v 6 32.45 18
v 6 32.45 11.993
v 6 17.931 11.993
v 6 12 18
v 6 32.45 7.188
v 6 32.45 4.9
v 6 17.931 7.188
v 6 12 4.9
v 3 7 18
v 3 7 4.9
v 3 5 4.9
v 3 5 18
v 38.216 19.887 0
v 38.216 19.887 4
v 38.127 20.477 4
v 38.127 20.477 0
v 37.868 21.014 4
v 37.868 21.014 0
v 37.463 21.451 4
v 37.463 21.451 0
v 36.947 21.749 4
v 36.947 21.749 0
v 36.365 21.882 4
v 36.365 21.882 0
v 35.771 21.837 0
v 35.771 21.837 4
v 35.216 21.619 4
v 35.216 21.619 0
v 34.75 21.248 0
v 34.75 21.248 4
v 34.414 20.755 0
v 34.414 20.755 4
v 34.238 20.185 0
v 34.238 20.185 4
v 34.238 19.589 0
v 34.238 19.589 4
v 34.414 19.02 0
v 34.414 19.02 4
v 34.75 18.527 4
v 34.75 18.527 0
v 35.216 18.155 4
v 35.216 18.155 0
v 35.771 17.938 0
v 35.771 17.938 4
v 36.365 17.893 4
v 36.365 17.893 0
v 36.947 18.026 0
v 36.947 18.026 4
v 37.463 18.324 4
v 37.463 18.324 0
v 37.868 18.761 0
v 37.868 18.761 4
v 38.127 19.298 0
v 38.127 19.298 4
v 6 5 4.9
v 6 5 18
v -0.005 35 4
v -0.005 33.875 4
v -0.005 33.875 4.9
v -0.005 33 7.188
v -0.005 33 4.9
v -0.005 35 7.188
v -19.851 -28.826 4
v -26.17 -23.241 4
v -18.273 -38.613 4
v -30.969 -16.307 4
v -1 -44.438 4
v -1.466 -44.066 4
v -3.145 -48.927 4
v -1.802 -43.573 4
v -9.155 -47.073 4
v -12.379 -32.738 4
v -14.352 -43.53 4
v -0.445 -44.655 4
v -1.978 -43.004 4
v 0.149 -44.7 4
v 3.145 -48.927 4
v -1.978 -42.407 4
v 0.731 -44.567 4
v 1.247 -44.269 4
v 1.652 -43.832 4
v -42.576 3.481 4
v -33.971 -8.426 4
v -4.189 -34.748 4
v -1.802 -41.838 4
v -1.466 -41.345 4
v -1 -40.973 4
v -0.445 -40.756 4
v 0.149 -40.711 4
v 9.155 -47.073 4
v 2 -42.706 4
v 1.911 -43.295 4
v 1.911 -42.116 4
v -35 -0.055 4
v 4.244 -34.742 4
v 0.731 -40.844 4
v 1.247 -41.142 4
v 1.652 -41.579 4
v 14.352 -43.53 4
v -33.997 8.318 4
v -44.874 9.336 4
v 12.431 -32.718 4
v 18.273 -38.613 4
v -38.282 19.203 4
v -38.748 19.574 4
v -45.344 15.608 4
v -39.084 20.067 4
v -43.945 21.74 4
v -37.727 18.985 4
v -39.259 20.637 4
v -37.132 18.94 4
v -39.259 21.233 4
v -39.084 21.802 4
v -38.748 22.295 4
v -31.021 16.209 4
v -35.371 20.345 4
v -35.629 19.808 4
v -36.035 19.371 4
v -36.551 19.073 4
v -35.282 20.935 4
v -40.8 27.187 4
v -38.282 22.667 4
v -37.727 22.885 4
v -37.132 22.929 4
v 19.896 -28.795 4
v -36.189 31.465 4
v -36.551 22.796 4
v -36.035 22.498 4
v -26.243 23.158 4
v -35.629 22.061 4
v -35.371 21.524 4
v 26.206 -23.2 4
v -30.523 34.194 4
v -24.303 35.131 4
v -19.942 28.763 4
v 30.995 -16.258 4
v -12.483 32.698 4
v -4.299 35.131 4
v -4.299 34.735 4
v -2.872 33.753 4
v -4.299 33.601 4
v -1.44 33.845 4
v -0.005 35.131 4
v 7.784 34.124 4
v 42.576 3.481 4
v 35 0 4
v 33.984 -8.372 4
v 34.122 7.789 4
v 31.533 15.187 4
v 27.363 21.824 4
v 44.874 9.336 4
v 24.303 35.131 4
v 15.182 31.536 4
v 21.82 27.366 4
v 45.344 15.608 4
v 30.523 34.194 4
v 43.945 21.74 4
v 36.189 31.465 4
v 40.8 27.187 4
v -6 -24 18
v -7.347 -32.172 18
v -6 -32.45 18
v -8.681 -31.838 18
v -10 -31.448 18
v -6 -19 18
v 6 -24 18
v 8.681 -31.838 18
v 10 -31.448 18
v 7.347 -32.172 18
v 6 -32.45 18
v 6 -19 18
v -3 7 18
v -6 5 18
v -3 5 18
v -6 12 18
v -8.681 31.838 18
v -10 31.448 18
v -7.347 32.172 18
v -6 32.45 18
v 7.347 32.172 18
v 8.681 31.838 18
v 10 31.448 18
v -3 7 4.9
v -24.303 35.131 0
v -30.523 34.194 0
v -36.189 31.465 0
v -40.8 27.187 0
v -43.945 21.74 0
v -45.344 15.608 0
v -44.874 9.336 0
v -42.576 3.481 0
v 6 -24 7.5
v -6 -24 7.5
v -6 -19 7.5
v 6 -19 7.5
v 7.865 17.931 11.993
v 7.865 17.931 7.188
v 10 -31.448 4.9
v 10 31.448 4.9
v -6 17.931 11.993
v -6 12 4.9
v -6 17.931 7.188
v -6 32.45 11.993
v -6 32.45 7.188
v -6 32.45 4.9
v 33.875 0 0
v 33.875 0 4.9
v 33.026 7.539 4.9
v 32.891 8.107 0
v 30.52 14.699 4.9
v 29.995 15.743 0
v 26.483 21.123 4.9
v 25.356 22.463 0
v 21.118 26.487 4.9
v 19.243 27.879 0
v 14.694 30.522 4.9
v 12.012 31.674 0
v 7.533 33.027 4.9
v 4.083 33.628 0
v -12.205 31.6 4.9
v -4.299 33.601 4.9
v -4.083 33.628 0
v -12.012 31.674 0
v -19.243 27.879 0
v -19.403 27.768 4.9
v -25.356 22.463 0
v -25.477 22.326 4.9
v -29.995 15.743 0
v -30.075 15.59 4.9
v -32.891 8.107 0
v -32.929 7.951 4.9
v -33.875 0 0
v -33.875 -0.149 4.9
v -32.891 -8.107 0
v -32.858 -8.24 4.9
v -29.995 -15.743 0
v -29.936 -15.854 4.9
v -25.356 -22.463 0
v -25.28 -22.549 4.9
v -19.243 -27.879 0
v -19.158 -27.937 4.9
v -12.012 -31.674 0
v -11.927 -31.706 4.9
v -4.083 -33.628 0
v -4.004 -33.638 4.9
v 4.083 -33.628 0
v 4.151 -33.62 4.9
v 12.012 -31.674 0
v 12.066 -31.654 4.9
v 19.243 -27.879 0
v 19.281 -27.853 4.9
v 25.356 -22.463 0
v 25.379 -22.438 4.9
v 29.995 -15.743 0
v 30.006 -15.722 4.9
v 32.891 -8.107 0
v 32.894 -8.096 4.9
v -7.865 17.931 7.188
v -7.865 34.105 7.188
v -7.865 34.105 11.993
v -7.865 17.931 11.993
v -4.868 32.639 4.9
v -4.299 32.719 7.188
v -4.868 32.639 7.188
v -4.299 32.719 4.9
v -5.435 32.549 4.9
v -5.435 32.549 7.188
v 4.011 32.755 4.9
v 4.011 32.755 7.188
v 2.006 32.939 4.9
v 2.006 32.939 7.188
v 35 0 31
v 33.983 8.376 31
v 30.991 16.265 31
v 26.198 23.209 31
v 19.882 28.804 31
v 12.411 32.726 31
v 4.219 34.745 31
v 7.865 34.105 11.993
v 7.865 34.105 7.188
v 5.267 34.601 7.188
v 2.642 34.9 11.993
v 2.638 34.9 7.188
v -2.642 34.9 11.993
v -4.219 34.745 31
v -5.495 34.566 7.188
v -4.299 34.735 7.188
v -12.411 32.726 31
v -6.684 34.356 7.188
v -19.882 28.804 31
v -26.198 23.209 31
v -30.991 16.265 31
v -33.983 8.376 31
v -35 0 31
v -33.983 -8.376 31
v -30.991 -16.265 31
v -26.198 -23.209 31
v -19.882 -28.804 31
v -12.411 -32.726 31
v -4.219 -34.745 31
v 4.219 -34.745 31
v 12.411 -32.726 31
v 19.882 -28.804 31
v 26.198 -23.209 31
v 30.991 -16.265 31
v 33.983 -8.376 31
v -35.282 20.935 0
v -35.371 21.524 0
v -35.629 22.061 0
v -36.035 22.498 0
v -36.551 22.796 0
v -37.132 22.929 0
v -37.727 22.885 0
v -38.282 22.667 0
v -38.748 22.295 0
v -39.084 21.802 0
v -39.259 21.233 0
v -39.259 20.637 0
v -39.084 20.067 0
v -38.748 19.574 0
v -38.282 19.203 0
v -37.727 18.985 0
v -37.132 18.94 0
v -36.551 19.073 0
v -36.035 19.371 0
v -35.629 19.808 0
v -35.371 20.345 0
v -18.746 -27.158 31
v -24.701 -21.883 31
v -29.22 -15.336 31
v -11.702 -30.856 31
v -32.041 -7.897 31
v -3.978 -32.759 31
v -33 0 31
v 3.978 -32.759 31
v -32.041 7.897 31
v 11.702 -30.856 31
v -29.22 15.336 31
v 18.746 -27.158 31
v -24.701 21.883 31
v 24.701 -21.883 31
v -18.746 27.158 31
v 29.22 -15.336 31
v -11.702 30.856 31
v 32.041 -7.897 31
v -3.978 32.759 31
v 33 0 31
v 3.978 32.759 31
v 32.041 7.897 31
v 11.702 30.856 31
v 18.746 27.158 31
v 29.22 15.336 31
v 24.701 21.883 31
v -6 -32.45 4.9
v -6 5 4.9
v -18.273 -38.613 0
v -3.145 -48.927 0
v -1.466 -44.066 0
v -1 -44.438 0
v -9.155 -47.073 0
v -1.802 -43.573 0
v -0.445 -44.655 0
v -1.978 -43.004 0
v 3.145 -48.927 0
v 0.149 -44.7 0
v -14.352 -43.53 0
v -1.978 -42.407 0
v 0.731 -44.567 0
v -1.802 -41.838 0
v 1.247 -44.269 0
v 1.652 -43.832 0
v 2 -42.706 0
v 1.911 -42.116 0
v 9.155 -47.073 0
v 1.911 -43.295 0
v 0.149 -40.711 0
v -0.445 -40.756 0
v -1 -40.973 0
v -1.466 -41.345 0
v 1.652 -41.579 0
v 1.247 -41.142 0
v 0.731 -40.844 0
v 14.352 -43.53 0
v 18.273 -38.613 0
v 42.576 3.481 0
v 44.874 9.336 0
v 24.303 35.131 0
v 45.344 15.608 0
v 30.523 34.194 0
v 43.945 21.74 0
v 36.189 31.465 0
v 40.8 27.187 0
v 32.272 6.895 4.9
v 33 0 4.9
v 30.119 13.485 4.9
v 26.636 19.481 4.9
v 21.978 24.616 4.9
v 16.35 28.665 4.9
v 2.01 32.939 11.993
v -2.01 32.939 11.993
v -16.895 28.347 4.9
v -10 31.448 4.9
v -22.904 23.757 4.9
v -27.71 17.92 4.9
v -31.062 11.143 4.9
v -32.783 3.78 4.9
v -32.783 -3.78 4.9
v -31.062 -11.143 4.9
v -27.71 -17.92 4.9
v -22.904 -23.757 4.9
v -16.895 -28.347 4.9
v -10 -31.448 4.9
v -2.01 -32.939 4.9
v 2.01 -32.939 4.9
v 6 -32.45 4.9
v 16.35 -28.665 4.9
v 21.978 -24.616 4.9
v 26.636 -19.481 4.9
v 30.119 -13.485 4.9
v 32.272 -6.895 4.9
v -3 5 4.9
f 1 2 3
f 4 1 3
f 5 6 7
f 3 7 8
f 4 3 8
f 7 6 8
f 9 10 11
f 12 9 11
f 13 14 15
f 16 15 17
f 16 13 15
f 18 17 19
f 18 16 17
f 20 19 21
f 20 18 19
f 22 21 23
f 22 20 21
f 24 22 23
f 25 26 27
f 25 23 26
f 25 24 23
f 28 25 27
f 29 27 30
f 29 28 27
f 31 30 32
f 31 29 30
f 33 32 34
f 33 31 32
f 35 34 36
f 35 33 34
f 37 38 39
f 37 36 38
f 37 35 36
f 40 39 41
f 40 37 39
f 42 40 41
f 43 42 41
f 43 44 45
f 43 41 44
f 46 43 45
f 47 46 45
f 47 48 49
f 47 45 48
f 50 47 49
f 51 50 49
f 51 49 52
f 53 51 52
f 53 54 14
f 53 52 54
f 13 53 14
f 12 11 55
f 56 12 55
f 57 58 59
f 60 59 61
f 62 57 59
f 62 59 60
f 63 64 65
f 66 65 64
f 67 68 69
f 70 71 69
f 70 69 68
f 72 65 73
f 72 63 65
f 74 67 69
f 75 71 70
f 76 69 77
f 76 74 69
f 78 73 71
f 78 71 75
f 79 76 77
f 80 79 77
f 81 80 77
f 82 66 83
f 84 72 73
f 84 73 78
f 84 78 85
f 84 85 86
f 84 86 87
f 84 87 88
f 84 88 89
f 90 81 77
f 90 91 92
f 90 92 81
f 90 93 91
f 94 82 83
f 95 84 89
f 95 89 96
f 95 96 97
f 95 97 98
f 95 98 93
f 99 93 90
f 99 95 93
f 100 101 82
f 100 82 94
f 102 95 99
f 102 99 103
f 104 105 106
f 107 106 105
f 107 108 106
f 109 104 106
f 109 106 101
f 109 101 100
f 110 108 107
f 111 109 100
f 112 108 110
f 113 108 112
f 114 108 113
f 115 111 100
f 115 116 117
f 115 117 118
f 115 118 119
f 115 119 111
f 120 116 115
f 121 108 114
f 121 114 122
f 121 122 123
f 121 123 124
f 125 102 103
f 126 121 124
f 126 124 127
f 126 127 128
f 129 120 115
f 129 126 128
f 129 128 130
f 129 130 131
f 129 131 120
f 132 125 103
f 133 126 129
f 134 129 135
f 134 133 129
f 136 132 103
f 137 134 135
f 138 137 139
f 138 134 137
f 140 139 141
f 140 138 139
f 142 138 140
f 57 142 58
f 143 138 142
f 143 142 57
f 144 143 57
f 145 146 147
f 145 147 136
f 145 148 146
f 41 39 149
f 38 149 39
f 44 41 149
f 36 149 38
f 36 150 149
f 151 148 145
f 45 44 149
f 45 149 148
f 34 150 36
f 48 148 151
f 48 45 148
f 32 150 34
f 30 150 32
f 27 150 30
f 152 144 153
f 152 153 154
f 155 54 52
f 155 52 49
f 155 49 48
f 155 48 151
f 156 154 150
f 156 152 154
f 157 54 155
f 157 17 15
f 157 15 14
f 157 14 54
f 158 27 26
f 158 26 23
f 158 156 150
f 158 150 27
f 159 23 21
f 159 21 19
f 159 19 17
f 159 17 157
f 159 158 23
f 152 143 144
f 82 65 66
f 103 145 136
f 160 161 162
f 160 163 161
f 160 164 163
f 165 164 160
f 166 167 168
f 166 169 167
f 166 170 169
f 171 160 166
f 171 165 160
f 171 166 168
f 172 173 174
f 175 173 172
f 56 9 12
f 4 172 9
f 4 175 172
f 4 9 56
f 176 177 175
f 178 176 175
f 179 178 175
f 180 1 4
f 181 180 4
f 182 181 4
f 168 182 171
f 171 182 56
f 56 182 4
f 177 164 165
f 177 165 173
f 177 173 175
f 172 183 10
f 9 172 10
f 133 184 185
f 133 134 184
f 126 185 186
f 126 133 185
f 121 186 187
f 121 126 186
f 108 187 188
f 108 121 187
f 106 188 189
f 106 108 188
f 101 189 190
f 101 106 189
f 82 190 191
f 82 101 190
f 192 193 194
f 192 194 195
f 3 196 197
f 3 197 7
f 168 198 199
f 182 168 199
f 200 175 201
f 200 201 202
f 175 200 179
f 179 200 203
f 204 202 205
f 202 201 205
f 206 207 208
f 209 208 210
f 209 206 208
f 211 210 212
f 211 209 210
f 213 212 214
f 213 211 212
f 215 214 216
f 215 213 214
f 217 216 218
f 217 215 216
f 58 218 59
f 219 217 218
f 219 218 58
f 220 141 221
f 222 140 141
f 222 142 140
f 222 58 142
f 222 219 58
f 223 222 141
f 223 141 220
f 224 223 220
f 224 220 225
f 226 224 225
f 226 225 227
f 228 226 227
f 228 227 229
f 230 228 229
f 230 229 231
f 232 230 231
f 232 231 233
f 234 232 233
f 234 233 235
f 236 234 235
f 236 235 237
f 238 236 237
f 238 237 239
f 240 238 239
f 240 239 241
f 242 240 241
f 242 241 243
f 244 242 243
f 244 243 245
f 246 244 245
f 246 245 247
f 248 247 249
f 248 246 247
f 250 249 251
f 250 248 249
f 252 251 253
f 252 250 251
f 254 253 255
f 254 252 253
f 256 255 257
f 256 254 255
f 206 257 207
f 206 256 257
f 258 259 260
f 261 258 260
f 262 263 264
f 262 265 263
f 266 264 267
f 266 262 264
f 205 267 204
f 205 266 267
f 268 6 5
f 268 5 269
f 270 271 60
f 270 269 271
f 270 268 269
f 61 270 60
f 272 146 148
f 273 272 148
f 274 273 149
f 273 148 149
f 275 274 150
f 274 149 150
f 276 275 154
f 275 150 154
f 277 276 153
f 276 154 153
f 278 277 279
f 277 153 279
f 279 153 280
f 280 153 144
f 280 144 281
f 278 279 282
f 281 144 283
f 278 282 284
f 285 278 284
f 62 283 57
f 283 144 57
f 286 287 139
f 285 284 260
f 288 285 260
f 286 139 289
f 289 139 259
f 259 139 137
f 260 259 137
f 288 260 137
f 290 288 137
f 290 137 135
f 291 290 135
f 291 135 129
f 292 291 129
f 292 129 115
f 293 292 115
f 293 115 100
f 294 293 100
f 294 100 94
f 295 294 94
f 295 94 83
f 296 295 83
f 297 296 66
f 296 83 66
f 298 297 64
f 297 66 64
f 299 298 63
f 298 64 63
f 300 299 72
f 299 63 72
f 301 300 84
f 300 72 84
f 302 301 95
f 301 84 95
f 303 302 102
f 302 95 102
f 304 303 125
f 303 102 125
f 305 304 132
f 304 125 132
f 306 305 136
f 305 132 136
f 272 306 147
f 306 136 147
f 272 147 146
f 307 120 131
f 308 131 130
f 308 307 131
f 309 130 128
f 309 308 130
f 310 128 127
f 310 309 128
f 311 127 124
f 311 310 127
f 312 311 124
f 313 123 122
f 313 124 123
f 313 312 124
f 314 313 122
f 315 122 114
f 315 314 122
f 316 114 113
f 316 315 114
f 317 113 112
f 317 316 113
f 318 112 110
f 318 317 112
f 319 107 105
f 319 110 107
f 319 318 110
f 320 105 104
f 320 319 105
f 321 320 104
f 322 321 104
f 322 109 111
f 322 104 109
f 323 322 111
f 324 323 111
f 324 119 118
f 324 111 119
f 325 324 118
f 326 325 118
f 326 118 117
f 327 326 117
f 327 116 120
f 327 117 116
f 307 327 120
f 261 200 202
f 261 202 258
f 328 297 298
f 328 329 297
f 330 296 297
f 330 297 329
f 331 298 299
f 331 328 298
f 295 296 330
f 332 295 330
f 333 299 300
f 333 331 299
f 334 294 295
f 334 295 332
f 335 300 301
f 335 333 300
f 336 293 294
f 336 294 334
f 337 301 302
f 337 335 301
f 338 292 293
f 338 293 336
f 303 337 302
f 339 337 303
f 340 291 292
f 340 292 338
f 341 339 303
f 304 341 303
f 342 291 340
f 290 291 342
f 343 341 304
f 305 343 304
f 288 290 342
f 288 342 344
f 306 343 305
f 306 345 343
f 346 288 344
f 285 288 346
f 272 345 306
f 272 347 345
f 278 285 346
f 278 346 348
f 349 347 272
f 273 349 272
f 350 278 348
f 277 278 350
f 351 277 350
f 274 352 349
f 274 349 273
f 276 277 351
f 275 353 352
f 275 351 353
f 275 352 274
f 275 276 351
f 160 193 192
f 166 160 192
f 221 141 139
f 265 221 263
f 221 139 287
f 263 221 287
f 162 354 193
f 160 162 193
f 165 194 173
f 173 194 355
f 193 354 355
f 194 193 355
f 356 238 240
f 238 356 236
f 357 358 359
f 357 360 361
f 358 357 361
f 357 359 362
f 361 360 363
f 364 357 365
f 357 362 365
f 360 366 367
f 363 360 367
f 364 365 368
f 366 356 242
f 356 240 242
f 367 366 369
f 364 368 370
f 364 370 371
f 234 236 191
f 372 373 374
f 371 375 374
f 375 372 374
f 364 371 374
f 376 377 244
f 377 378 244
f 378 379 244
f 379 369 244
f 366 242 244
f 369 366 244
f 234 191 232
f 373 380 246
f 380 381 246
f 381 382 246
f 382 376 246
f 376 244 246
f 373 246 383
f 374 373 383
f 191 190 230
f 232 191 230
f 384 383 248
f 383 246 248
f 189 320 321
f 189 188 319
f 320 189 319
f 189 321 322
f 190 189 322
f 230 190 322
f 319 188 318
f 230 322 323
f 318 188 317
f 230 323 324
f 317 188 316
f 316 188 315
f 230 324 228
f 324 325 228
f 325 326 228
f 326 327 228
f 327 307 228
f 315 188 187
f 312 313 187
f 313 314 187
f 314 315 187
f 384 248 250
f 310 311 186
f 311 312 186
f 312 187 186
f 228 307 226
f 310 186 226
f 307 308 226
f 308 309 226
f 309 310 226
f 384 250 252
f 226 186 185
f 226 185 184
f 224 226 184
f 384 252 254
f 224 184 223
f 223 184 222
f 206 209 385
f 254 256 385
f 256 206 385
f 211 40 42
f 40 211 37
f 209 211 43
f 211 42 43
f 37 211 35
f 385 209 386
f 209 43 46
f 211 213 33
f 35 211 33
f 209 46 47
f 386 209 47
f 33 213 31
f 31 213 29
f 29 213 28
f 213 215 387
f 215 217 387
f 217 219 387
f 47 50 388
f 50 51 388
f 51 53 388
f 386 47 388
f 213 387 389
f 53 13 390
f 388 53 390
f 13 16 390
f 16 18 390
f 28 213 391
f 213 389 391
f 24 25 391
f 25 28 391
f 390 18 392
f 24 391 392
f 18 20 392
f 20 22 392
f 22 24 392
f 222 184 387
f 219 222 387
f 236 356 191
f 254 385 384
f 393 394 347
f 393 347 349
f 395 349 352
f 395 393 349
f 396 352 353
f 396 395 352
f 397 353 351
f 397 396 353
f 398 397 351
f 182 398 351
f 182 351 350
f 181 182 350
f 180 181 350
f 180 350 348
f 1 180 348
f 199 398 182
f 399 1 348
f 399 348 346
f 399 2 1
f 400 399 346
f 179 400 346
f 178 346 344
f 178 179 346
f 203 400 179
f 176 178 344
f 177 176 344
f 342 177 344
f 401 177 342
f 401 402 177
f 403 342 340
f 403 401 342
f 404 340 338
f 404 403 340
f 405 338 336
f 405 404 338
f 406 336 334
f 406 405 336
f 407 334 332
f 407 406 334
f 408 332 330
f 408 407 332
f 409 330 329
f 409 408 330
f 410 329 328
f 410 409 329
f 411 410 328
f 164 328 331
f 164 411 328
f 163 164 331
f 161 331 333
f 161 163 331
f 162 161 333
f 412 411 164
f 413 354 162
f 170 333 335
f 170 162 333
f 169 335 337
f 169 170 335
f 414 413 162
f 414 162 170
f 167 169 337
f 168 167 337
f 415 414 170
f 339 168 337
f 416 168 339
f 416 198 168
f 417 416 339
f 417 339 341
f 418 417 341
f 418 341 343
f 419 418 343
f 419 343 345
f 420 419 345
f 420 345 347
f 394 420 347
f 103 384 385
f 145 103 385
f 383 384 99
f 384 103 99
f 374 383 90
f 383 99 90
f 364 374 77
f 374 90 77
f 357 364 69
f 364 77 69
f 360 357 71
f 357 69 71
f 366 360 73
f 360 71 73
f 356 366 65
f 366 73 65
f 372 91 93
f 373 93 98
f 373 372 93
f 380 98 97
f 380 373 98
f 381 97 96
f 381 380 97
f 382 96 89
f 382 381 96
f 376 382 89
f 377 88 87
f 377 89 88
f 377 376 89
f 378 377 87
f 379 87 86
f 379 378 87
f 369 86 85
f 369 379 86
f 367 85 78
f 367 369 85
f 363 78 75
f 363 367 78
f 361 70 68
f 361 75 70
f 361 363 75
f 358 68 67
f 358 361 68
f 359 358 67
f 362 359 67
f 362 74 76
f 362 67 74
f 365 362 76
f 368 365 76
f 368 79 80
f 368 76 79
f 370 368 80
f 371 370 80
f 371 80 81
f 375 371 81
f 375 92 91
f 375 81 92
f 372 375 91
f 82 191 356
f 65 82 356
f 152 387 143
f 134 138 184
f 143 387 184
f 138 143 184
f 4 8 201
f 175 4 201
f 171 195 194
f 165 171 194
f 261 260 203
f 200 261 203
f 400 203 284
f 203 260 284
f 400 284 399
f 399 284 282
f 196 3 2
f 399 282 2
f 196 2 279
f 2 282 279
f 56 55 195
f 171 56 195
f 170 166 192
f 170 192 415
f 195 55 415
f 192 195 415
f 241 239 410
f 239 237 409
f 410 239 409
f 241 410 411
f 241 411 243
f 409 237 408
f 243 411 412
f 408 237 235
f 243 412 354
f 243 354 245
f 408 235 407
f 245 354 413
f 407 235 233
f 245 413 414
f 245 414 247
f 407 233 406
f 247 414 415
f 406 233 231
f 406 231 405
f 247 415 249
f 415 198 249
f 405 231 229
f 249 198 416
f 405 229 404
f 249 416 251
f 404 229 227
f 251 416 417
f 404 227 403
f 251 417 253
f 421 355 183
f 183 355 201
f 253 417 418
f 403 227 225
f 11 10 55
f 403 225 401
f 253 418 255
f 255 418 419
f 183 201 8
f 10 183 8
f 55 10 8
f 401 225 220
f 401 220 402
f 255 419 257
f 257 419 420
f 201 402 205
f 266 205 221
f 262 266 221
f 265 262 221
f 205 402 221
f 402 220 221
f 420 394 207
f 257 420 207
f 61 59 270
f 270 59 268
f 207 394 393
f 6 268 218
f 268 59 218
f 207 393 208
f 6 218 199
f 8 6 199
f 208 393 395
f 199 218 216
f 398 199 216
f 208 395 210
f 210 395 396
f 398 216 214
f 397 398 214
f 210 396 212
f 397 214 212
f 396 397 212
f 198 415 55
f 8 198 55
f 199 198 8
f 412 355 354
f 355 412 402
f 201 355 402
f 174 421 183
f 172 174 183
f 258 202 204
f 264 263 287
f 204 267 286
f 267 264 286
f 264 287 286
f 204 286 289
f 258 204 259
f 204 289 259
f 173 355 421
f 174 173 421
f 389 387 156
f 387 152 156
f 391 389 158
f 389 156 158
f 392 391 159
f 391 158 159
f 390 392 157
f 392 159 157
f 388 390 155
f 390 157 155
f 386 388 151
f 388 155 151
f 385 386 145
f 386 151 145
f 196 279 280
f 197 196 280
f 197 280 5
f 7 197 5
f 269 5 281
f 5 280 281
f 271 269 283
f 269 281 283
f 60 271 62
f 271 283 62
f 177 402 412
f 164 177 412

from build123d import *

# Parameters (mm, degrees)
F0_R              = 35
F0_R_2            = 33
F2_DEPTH          = 31
F3_DEPTH          = 18
F4_E28_W          = 6
F4_E28_H          = 7.5
F4_E39_MIRRORCS_W = 6
F4_E39_MIRRORCS_H = 7.5
F5_DEPTH          = 9.3
F7_DEPTH          = 4
F8_R              = 21.1
F9_R              = 2
F10_DEPTH         = 38
F11_DEPTH         = 52
F12_DEPTH         = 37.9
F13_R             = 33.8752288108
F14_DEPTH         = 4.9
F15_W             = 4.2938441038
F15_H             = 3.1884626523
F16_DEPTH         = 17.2


with BuildPart() as f2:
    # F0 (on Top) → F2 (new body)
    with BuildSketch(Plane.XY):
        Circle(F0_R)
        Circle(F0_R_2, mode=Mode.SUBTRACT)
    extrude(amount=F2_DEPTH)

    # F1 (on Top) → F3 (join)
    with BuildSketch(Plane.XY):
        Polygon((10, -32.0528298616), (10, -24), (10, 32.2797112167), (6, 33.4707275033), (6, 12), (3, 12), (0, 12), (-3, 12), (-6, 12), (-6, 33.4707275033), (-10, 32.2797112167), (-10, -24), (-10, -32.0528298616), (-6, -33.1044308841), (-6, -24), (0, -24), (6, -24), (6, -33.1044308841), align=None)
        Polygon((0, 7), (3, 7), (3, 5), (6, 5), (6, -19), (0, -19), (-6, -19), (-6, 5), (-3, 5), (-3, 7), align=None, mode=Mode.SUBTRACT)
    extrude(amount=F3_DEPTH)

    # F4_E28 (on explicit) + F4_E39_MirrorCS (on explicit) → F5 (cut)
    with BuildSketch(Plane.XZ.offset(24)):
        with Locations((3, 3.75)):
            Rectangle(F4_E28_W, F4_E28_H)
    with BuildSketch(Plane(origin=(0, -24, 0), x_dir=(-1, 0, 0), z_dir=(0, 1, 0))):
        with Locations((3, 3.75)):
            Rectangle(F4_E39_MIRRORCS_W, F4_E39_MIRRORCS_H)
    extrude(amount=-F5_DEPTH, dir=(0, -1, 0), mode=Mode.SUBTRACT)

    # F6 (on Top) → F7 (join)
    with BuildSketch(Plane.XY):
        Polygon((60.8495350583, 35.131495446), (-60.8495350583, 35.131495446), (0, -70.2629908919), align=None)
    extrude(amount=F7_DEPTH)

    # F8
    f8_edges = [f2.edges().sort_by_distance(p)[0] for p in [
        (-60.849535, 35.131495, 2),
        (60.849535, 35.131495, 2),
        (0, -70.262991, 2),
    ]]
    fillet(f8_edges, radius=F8_R)

    # F9 (on Top) → F10 (cut)
    with BuildSketch(Plane.XY):
        with Locations((-37.2817739844, 20.93468979)):
            Circle(F9_R)
        with Locations((0, -42.7055284381)):
            Circle(F9_R)
        with Locations((36.2159647048, 19.8873784393)):
            Circle(F9_R)
    extrude(amount=-F10_DEPTH, mode=Mode.SUBTRACT)

    # F9 (on Top) → F11 (cut)
    with BuildSketch(Plane.XY):
        with Locations((36.2159647048, 19.8873784393)):
            Circle(F9_R)
    extrude(amount=F11_DEPTH, mode=Mode.SUBTRACT)

    # F9 (on Top) → F12 (cut)
    with BuildSketch(Plane.XY):
        with Locations((-37.2817739844, 20.93468979)):
            Circle(F9_R)
        with Locations((0, -42.7055284381)):
            Circle(F9_R)
    extrude(amount=F12_DEPTH, mode=Mode.SUBTRACT)

    # F13 (on Top) → F14 (cut)
    with BuildSketch(Plane.XY):
        Circle(F13_R)
    extrude(amount=F14_DEPTH, mode=Mode.SUBTRACT)

    # F15 (on face) → F16 (cut)
    with BuildSketch(Plane(origin=(0, 35.131495446, 0), x_dir=(-1, 0, 0), z_dir=(0, 1, 0))):
        Polygon((-7.865479216, 7.1884626523), (-0.6682581179, 7.1884626523), (0.0053993426, 7.1884626523), (0.0053993426, 10.3769253045), (4.2992434464, 10.3769253045), (4.2992434464, 7.1884626523), (7.865479216, 7.1884626523), (7.865479216, 11.9928242639), (-7.865479216, 11.9928242639), align=None)
        with Locations((2.1523213945, 8.7826939784)):
            Rectangle(F15_W, F15_H)
        with Locations((2.1523213945, 5.5942313261)):
            Rectangle(F15_W, F15_H)
    extrude(amount=-F16_DEPTH, mode=Mode.SUBTRACT)


solid = f2.part
